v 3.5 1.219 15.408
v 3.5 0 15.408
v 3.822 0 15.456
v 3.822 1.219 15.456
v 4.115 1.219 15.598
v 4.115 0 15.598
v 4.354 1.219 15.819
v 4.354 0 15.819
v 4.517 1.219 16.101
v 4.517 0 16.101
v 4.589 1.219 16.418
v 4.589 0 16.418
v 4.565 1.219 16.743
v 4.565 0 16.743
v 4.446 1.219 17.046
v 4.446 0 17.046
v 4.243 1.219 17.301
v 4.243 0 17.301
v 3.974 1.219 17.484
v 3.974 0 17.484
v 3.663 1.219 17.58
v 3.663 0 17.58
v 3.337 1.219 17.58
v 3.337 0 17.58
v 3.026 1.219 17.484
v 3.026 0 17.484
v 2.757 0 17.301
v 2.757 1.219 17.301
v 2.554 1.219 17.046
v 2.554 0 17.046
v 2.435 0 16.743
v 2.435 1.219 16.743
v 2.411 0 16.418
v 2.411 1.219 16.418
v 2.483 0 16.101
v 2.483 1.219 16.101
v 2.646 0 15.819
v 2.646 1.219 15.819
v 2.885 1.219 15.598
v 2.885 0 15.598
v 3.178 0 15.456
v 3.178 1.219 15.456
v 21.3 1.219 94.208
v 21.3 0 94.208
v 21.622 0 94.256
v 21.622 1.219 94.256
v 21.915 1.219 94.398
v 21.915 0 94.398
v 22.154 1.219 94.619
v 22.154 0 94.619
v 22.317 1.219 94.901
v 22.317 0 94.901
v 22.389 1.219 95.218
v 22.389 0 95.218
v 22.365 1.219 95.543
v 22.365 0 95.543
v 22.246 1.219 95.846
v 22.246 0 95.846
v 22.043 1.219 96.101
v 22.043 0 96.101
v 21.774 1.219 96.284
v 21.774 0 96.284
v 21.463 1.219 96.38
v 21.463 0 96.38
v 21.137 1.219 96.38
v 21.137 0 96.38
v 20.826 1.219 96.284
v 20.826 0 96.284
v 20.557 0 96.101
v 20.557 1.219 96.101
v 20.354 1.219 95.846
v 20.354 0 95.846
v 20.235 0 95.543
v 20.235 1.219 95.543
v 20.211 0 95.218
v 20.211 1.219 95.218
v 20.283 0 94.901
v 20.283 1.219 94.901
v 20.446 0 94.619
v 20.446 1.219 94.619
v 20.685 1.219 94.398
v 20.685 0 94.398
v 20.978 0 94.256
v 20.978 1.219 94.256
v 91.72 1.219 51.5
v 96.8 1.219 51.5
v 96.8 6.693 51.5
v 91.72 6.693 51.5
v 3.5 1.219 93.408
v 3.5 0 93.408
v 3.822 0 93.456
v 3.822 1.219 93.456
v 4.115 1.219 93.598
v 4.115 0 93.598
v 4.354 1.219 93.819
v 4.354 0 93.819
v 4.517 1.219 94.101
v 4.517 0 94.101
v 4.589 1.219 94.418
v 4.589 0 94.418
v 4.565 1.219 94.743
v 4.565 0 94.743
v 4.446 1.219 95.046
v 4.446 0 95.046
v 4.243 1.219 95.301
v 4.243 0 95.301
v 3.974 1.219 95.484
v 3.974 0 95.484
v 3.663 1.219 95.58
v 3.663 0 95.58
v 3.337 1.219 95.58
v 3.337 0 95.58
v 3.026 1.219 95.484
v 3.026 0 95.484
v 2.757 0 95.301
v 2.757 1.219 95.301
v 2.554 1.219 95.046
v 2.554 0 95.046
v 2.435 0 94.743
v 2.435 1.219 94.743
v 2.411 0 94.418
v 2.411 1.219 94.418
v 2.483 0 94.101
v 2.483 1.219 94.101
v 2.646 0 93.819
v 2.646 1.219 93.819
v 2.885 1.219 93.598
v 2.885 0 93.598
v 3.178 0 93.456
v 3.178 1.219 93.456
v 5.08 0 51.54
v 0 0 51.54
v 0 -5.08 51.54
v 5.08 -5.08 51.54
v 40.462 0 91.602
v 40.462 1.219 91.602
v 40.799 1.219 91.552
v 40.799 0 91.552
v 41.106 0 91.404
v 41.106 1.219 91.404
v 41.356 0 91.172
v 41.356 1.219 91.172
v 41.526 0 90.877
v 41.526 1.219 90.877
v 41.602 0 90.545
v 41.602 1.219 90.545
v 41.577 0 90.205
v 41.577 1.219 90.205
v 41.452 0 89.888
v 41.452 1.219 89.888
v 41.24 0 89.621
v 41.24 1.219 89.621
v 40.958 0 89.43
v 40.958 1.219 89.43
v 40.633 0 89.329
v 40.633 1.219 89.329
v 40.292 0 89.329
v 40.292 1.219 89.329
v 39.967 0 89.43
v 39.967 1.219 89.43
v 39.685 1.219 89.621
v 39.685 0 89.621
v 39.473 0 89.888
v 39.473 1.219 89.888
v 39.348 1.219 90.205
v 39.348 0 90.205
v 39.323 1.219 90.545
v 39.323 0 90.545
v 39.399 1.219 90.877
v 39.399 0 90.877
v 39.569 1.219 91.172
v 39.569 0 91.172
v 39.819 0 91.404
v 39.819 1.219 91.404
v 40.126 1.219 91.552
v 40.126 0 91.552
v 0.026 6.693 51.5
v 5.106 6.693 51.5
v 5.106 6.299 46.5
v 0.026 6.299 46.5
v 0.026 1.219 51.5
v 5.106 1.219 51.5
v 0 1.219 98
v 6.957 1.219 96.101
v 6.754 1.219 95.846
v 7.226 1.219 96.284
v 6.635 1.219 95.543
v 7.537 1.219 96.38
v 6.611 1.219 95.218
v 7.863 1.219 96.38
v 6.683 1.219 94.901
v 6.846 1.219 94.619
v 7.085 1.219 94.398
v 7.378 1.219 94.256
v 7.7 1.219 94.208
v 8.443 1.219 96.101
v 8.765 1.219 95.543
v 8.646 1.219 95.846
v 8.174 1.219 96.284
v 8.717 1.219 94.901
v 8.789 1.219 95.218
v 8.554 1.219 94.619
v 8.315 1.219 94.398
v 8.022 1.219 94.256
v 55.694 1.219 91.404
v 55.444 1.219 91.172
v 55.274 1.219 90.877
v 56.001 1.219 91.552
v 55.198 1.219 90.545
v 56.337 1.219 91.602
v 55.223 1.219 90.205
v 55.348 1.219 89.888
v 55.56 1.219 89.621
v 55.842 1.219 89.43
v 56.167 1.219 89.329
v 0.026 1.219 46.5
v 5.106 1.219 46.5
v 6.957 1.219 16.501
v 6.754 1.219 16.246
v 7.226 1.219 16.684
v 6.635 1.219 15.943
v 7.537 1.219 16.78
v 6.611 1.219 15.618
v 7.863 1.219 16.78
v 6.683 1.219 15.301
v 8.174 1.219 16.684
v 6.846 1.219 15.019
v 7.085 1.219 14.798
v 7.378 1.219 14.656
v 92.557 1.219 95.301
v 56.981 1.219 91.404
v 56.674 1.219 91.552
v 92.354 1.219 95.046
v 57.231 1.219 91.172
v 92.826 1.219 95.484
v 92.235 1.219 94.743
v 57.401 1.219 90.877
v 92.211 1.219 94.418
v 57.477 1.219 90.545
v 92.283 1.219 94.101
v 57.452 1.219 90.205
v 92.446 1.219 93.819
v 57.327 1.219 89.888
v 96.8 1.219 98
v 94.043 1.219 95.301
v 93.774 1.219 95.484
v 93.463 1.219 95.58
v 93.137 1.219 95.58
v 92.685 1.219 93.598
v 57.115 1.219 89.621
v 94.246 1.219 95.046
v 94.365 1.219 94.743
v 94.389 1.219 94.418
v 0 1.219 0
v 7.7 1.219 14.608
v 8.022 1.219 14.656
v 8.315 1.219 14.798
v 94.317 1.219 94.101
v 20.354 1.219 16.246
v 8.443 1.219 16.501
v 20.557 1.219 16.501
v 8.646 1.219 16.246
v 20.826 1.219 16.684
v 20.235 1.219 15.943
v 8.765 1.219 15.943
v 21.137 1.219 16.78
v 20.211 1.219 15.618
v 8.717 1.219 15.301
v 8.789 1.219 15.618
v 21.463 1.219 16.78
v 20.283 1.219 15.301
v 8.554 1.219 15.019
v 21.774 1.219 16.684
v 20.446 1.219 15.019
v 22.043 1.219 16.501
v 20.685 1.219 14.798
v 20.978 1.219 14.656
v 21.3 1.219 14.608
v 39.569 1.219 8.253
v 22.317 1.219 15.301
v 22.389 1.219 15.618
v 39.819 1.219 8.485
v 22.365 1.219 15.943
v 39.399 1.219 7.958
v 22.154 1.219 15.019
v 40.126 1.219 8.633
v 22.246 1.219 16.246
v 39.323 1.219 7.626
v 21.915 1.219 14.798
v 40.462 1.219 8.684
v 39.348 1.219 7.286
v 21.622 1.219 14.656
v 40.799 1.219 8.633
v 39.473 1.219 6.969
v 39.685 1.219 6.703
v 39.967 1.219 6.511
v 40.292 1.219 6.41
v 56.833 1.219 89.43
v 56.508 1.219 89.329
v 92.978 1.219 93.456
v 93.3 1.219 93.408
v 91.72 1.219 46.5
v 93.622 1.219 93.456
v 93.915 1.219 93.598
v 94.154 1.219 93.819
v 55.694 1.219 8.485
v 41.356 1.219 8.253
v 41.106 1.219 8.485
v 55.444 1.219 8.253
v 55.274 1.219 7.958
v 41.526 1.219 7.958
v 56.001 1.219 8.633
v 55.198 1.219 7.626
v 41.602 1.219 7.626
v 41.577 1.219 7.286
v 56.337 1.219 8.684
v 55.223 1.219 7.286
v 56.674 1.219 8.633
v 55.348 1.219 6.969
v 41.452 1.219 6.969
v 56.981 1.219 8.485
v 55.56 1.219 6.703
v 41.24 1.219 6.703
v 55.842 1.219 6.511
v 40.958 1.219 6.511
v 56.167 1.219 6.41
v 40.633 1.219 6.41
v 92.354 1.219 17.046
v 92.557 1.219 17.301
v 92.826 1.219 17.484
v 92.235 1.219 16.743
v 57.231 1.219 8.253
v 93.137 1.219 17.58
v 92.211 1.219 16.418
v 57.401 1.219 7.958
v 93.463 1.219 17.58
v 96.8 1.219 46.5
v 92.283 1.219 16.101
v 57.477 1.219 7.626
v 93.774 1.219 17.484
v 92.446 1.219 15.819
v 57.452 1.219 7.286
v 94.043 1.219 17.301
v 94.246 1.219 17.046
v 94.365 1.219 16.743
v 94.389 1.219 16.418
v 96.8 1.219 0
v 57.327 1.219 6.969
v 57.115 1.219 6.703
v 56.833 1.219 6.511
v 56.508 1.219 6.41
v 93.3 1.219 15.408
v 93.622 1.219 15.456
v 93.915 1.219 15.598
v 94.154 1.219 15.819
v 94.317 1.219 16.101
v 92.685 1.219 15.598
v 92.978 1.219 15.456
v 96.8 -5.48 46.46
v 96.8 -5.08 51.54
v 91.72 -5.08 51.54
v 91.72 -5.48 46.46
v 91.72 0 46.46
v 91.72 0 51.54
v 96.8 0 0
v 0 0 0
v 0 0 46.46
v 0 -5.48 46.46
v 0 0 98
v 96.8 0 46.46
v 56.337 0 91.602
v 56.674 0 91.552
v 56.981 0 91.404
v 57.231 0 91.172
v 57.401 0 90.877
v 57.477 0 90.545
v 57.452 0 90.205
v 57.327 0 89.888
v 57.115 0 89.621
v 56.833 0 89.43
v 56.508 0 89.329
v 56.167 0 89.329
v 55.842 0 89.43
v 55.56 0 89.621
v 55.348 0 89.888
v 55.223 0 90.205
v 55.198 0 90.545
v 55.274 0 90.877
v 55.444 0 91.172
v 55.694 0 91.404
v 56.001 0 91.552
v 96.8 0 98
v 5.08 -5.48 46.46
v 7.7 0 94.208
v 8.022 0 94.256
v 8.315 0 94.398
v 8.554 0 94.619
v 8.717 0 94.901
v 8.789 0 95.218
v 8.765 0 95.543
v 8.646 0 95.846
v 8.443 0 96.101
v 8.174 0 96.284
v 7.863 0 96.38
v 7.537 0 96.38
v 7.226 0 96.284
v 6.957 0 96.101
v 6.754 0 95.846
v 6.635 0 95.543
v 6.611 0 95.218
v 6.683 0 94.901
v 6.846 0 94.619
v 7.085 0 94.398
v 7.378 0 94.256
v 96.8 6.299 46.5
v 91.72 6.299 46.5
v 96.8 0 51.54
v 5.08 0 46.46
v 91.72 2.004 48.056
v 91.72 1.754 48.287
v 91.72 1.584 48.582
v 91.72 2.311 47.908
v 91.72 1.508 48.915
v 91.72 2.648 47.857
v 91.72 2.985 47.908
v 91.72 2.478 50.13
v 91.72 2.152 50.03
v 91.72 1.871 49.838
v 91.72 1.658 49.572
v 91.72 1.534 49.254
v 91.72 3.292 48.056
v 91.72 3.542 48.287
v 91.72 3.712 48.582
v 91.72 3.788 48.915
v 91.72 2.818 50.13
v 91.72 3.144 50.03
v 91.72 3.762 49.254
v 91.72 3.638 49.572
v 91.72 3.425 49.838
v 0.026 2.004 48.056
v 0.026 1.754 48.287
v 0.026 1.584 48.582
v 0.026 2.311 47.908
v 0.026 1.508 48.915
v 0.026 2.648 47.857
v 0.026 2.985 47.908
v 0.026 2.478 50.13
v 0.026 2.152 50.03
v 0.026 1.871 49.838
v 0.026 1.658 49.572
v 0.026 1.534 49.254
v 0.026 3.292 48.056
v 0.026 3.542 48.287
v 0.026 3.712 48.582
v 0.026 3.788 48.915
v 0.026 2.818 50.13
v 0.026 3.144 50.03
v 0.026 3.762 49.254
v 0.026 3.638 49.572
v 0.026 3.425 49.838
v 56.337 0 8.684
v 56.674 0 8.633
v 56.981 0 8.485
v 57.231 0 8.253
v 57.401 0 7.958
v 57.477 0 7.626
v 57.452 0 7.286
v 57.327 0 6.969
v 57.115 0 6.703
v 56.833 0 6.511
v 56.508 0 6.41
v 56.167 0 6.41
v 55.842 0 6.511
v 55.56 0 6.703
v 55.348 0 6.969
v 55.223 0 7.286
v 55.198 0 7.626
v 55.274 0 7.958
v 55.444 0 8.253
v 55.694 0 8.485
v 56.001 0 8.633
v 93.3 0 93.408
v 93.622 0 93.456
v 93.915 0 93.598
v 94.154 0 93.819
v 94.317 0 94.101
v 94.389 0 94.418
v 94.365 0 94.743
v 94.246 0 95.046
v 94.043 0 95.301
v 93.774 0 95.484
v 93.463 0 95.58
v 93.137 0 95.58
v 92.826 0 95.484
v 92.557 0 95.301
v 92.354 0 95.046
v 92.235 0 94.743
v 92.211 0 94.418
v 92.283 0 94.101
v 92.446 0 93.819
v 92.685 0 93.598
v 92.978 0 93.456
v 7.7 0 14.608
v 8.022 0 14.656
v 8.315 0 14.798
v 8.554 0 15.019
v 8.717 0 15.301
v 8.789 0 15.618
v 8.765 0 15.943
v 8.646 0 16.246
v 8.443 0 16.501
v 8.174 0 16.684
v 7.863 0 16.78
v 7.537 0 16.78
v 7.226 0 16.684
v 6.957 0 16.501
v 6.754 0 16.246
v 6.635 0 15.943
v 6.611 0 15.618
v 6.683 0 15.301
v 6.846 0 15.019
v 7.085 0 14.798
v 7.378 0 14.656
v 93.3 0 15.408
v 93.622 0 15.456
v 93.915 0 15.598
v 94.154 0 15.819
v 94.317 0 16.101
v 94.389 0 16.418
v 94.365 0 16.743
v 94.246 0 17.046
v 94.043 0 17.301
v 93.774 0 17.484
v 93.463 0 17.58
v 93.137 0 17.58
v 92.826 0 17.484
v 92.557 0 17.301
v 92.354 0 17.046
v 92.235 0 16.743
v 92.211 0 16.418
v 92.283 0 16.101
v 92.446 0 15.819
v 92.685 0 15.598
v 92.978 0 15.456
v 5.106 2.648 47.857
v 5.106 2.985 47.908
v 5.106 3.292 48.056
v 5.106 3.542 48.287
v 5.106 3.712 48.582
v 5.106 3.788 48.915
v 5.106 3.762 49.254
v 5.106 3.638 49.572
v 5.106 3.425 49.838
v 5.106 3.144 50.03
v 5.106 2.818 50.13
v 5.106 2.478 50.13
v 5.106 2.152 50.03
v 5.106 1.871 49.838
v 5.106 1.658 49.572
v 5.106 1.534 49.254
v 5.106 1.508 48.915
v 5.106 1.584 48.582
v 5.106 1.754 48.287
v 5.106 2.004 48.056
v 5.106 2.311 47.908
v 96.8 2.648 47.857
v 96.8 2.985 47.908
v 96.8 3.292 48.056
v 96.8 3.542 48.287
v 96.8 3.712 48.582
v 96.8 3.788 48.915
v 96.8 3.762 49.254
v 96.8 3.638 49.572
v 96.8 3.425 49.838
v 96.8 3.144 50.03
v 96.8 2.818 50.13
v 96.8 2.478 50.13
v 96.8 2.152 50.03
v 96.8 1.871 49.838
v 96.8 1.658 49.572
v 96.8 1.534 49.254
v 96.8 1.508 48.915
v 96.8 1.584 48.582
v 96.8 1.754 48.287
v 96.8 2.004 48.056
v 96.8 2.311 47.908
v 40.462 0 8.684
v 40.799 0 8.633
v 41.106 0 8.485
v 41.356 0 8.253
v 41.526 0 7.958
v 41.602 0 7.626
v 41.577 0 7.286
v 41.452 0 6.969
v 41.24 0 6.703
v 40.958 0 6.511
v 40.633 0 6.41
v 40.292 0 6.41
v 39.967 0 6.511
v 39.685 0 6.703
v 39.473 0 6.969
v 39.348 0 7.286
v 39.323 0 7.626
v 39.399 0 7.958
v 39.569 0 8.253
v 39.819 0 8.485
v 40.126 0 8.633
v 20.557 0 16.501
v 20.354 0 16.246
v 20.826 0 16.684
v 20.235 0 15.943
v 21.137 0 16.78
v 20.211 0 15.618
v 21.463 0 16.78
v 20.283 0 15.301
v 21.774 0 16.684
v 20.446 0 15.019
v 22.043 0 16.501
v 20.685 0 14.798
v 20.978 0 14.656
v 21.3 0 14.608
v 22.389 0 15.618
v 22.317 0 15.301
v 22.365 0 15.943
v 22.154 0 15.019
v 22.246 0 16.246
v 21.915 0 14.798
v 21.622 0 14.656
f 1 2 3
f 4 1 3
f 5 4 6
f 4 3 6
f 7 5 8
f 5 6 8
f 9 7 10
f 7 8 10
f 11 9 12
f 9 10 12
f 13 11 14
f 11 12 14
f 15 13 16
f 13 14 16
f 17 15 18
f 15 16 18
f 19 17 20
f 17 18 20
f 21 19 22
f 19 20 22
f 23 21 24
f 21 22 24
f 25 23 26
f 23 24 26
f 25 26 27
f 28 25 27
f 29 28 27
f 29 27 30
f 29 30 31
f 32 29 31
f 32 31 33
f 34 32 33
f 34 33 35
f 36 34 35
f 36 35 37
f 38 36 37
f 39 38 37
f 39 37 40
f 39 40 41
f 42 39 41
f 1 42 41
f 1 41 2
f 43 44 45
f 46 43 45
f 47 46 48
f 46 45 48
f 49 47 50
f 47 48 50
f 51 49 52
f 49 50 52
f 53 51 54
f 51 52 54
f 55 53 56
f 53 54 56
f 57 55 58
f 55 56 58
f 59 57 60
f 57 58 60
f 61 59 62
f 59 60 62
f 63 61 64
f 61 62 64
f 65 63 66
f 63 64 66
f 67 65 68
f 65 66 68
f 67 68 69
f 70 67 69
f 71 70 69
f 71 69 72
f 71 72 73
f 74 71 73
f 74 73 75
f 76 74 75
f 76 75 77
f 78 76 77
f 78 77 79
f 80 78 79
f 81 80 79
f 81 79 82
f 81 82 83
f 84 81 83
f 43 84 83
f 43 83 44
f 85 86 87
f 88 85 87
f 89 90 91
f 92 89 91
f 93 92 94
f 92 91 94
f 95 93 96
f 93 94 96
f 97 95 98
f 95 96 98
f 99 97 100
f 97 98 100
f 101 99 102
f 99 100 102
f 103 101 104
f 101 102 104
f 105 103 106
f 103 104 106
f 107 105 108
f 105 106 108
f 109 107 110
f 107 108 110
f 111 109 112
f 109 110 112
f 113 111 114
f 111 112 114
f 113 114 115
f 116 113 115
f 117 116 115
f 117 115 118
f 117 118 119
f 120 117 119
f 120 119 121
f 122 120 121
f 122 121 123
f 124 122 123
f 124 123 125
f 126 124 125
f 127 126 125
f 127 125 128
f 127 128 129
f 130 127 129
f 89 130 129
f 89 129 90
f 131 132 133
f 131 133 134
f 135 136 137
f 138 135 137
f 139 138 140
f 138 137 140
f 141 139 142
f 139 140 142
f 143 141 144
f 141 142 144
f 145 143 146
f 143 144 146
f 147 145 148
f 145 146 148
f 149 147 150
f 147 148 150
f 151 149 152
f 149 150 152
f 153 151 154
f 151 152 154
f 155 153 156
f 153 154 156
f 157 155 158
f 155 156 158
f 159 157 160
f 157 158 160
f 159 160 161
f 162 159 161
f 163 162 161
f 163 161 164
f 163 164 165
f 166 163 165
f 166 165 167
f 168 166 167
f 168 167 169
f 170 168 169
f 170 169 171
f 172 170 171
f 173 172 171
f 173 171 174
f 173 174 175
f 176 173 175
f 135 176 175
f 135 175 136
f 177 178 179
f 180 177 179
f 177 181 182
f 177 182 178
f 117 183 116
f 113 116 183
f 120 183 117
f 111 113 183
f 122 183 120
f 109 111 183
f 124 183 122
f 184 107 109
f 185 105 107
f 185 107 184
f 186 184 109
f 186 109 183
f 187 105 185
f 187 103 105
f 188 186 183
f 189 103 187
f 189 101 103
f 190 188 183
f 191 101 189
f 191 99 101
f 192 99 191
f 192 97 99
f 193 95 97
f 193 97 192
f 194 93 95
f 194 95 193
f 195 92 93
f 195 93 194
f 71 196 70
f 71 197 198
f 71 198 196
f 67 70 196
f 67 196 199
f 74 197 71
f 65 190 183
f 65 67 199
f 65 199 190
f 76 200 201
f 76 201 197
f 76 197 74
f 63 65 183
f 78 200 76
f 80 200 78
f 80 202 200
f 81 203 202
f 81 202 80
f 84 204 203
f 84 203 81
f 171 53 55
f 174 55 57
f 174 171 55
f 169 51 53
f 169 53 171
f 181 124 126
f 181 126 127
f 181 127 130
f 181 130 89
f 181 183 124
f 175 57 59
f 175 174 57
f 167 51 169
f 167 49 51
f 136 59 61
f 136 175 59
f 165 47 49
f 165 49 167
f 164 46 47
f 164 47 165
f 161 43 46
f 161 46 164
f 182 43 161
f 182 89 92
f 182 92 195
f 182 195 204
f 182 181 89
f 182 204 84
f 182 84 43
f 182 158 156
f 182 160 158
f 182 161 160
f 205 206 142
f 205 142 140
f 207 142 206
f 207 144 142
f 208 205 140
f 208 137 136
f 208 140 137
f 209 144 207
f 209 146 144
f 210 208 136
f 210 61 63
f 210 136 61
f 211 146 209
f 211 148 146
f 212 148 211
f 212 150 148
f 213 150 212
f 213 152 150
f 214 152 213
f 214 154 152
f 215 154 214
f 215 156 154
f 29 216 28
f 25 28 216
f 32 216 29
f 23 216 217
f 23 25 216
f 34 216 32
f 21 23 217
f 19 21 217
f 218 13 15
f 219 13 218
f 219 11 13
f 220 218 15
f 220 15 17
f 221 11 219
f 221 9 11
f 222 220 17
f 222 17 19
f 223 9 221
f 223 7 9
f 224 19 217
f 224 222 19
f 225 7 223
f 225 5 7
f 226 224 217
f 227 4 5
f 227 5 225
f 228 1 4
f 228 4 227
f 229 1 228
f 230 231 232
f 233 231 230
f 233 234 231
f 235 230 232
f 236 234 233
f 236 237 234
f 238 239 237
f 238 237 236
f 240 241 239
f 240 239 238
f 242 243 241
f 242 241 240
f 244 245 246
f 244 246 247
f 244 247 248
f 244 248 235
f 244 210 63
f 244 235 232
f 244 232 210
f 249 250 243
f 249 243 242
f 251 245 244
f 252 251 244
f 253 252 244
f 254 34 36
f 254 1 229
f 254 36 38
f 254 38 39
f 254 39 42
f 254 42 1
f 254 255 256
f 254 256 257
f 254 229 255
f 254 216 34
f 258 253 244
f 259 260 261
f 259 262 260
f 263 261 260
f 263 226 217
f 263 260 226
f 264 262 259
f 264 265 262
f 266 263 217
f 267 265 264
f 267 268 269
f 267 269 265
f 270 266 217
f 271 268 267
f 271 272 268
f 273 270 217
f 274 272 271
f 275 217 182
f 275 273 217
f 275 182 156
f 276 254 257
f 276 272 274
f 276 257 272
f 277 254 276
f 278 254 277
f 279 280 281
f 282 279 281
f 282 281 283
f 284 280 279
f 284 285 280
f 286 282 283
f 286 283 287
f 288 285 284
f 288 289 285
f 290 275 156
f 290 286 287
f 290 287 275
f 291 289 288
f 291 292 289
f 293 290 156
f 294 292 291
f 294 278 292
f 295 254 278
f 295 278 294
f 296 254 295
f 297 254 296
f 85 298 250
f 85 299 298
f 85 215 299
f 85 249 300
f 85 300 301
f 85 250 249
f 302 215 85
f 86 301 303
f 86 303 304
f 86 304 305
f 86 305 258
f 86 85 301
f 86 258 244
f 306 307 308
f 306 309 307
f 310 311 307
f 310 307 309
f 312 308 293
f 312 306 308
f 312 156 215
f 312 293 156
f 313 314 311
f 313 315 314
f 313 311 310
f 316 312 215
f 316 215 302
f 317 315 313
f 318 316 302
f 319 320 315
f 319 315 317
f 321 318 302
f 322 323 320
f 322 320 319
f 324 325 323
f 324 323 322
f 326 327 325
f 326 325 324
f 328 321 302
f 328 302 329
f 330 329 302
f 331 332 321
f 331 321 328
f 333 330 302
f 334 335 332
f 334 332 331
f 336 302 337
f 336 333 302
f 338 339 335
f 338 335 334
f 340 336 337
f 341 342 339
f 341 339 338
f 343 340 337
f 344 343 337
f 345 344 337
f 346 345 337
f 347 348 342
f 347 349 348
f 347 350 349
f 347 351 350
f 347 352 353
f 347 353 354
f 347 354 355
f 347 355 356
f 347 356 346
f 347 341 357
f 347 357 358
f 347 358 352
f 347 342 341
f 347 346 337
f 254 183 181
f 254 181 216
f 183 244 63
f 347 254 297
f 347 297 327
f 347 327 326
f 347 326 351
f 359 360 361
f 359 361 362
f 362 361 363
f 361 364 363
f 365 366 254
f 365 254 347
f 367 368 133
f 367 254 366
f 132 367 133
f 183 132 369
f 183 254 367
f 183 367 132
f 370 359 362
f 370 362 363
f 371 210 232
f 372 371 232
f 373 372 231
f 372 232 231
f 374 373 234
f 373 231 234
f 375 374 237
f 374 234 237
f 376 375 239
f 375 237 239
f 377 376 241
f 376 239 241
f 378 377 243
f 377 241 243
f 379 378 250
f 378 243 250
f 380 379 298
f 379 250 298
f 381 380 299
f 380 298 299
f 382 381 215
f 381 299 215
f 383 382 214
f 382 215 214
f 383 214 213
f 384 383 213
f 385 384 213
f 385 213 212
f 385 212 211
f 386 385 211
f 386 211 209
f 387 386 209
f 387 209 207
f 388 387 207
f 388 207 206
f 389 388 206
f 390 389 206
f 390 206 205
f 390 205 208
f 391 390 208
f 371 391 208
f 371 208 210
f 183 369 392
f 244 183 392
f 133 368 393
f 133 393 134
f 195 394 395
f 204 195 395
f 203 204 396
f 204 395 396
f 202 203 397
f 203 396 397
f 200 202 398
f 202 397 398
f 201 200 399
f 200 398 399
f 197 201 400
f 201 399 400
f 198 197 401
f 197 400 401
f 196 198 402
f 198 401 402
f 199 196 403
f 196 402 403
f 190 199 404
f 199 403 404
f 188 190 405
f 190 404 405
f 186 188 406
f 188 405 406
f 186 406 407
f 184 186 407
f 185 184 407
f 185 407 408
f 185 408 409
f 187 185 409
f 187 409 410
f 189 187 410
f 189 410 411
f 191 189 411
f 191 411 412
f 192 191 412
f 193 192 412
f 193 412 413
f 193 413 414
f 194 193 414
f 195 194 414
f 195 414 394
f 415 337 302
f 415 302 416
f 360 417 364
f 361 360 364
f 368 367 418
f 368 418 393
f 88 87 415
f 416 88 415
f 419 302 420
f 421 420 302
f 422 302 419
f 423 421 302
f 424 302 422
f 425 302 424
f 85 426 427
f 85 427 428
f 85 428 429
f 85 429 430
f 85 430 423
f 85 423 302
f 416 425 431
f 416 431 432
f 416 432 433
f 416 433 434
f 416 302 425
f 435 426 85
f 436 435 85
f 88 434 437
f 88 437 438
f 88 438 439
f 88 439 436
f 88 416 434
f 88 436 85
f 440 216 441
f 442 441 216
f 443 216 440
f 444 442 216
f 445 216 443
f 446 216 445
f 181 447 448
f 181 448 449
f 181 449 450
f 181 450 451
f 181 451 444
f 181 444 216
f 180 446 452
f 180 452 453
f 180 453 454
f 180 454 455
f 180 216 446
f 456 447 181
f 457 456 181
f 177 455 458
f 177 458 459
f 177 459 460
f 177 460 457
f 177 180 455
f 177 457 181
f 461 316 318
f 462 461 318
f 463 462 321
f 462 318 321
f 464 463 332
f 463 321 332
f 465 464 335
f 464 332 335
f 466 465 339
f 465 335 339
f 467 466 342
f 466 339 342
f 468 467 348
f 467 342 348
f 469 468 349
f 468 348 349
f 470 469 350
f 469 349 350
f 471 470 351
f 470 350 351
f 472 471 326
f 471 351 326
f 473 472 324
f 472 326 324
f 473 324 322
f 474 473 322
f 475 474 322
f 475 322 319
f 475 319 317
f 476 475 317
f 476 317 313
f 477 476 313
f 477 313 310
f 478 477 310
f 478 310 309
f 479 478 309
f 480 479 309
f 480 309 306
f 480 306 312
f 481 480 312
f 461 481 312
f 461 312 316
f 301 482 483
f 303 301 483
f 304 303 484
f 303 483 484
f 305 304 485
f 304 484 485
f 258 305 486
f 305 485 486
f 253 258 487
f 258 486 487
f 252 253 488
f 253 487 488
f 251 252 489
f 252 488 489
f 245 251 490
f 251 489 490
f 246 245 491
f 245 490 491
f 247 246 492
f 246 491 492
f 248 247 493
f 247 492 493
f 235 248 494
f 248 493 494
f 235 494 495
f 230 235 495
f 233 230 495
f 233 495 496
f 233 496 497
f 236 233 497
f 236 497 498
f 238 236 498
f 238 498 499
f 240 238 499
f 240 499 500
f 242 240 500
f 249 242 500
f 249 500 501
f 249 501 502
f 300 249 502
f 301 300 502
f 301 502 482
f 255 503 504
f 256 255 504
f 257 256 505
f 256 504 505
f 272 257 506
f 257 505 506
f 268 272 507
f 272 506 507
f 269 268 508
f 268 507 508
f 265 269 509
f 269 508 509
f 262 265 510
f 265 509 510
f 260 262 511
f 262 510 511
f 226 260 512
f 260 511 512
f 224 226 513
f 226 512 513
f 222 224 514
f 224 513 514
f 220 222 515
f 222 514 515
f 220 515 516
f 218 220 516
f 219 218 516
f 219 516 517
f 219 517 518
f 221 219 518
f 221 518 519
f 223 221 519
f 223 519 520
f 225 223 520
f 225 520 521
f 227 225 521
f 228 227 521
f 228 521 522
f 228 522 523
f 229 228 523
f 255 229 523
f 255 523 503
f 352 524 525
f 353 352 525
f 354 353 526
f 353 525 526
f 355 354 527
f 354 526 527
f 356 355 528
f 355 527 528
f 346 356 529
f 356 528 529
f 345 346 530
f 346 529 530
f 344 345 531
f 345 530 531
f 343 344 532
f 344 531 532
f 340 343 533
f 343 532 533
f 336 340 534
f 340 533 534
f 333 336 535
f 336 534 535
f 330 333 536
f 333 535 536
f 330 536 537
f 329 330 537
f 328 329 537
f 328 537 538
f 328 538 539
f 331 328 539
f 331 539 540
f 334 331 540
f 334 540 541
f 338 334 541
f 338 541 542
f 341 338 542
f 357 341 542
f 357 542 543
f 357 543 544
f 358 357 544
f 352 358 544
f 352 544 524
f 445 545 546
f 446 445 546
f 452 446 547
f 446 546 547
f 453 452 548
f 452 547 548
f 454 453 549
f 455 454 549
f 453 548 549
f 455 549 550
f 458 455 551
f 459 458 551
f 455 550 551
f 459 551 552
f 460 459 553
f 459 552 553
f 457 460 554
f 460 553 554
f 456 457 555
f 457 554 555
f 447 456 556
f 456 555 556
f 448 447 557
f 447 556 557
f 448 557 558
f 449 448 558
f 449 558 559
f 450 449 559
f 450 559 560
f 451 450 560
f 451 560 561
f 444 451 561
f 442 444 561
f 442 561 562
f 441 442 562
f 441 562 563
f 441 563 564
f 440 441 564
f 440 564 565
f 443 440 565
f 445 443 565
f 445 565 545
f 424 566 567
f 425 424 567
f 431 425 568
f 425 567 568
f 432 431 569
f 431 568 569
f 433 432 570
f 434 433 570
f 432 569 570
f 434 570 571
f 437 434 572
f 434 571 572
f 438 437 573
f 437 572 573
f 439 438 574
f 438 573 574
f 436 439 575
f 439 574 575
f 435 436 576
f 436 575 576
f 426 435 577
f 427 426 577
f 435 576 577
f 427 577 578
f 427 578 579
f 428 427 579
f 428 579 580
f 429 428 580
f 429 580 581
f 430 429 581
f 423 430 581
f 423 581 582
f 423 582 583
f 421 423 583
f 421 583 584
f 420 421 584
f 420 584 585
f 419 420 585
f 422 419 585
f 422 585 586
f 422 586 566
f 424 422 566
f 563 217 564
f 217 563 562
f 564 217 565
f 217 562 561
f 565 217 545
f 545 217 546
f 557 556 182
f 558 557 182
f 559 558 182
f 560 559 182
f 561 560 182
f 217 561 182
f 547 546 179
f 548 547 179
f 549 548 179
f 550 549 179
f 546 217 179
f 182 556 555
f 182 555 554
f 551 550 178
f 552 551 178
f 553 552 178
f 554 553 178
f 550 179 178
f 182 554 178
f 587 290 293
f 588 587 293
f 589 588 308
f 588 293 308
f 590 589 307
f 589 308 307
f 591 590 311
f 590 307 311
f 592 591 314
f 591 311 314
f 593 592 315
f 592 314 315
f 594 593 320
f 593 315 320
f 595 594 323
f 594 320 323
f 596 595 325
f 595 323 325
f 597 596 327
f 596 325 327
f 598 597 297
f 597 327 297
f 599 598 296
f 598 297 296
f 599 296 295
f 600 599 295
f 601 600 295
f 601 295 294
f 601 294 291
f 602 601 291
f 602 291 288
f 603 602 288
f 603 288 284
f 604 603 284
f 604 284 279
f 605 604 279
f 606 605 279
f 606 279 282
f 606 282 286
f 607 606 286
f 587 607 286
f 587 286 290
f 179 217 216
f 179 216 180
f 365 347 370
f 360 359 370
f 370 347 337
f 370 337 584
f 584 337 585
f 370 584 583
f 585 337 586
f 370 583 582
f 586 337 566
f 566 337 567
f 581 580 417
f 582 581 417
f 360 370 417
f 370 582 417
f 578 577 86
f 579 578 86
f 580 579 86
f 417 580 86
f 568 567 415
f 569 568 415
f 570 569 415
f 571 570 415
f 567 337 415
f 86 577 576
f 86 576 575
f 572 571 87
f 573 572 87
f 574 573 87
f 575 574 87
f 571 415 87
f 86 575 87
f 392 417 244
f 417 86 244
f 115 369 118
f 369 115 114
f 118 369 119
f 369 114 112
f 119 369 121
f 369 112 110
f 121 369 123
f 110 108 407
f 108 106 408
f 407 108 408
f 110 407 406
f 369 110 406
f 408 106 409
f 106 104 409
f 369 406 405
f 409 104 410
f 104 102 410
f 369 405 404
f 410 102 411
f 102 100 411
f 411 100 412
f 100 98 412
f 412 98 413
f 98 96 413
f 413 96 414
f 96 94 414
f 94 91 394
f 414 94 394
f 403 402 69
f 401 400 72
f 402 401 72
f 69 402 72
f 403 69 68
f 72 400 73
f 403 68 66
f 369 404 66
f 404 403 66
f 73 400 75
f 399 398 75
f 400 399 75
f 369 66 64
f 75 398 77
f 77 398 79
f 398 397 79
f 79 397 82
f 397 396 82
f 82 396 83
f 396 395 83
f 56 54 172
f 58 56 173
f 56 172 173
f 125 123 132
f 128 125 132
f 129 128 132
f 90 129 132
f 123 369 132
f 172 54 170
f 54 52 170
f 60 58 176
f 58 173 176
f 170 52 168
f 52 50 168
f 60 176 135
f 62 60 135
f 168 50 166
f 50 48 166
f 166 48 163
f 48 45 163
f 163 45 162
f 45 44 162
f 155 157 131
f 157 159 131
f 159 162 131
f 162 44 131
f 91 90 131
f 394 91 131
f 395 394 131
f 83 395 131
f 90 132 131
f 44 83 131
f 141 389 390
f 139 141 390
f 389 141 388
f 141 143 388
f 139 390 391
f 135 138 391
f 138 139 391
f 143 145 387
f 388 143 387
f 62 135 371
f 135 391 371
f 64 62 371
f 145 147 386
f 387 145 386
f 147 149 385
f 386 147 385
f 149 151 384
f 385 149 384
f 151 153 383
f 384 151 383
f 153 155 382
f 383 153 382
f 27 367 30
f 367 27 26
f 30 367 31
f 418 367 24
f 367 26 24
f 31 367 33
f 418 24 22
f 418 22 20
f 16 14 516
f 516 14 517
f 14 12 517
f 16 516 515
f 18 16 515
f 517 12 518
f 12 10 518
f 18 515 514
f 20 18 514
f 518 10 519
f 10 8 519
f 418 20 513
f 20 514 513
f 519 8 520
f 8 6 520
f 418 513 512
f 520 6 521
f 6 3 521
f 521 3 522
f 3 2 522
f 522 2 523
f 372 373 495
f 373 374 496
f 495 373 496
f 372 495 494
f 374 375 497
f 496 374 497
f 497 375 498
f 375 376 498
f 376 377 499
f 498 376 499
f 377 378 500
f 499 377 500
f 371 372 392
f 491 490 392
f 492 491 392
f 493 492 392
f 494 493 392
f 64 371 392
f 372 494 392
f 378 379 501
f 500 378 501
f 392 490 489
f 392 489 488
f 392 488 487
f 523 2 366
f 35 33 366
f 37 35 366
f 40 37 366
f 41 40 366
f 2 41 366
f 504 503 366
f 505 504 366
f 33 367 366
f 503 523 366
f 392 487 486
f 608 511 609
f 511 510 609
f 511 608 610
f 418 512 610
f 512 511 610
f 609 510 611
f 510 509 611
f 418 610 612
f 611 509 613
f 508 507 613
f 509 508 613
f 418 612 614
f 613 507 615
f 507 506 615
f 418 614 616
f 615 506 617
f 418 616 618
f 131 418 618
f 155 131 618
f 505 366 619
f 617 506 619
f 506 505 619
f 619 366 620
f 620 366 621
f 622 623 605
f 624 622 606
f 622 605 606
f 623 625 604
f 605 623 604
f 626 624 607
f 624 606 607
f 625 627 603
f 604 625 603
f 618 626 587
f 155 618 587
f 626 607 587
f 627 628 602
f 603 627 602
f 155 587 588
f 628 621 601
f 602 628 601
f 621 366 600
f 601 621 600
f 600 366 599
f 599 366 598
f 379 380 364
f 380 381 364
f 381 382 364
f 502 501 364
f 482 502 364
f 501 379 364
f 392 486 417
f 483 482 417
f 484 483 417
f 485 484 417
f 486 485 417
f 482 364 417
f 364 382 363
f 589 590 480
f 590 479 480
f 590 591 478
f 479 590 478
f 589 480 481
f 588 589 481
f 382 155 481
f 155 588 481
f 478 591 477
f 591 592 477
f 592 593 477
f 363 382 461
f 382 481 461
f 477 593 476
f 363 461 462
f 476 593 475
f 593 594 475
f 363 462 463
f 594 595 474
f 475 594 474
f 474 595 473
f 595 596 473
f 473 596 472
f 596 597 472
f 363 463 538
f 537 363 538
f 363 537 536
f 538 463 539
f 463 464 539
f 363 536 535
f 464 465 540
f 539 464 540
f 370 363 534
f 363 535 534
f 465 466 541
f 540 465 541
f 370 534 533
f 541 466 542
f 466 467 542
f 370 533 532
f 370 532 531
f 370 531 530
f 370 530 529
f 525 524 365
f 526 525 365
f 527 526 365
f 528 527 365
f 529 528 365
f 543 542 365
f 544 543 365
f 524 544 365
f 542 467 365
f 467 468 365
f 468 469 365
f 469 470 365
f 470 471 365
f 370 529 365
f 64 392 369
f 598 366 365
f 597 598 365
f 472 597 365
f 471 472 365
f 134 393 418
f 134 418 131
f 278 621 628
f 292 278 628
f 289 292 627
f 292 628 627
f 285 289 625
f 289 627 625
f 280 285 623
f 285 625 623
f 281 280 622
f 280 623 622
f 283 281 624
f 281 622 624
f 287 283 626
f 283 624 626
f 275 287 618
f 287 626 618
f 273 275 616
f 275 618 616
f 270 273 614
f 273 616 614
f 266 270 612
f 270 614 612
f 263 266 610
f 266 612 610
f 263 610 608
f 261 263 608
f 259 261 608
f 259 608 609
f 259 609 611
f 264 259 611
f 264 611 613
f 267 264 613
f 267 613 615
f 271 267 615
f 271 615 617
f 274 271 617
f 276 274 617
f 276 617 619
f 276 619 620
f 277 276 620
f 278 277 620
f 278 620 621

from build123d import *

# Parameters (mm, degrees)
SKETCH1_W           = 96.799999948
SKETCH1_H           = 98
BOSS_EXTRUDE1_DEPTH = 1.2192
CUT_EXTRUDE1_REACH  = 139.752
SKETCH5_R           = 1.0922
CUT_EXTRUDE2_REACH  = 139.752
SKETCH6_R           = 1.143
SKETCH10_W          = 5
SKETCH10_H          = 5.08
SKETCH10_R          = 1.143
BOSS_EXTRUDE2_DEPTH = 96.774
SKETCH13_W          = 86.614
SKETCH13_H          = 5
CUT_EXTRUDE3_DEPTH  = 5.08
BOSS_EXTRUDE3_DEPTH = 5.08
BOSS_EXTRUDE5_DEPTH = 5.08
BOSS_EXTRUDE6_DEPTH = 5.08
BOSS_EXTRUDE7_DEPTH = 5.08
BOSS_EXTRUDE8_DEPTH = 5.08


with BuildPart() as part:
    # Sketch1 → Boss-Extrude1 (new body)
    with BuildSketch(Plane(origin=(0, 0, 0), x_dir=(1, 0, 0), z_dir=(0, 1, 0))):
        with Locations((48.399999974, -49)):
            Rectangle(SKETCH1_W, SKETCH1_H)
    extrude(amount=BOSS_EXTRUDE1_DEPTH)

    # Sketch5 → Cut-Extrude1 (cut, up to next)
    with BuildSketch(Plane(origin=(0, 0, 0), x_dir=(-1, 0, 0), z_dir=(0, -1, 0)), mode=Mode.PRIVATE) as cut_extrude1_sk1:
        with Locations(Location((-3.5, -94.5, 0), (0, 0, 90))):
            Circle(SKETCH5_R)
    cut_extrude1_tool1 = extrude(cut_extrude1_sk1.sketch, amount=-CUT_EXTRUDE1_REACH, mode=Mode.PRIVATE) & part.part
    # Sketch5 → Cut-Extrude1 (cut, up to next)
    with BuildSketch(Plane(origin=(0, 0, 0), x_dir=(-1, 0, 0), z_dir=(0, -1, 0)), mode=Mode.PRIVATE) as cut_extrude1_sk2:
        with Locations(Location((-7.7, -95.3, 0), (0, 0, 90))):
            Circle(SKETCH5_R)
    cut_extrude1_tool2 = extrude(cut_extrude1_sk2.sketch, amount=-CUT_EXTRUDE1_REACH, mode=Mode.PRIVATE) & part.part
    # Sketch5 → Cut-Extrude1 (cut, up to next)
    with BuildSketch(Plane(origin=(0, 0, 0), x_dir=(-1, 0, 0), z_dir=(0, -1, 0)), mode=Mode.PRIVATE) as cut_extrude1_sk3:
        with Locations(Location((-21.3, -95.3, 0), (0, 0, 90))):
            Circle(SKETCH5_R)
    cut_extrude1_tool3 = extrude(cut_extrude1_sk3.sketch, amount=-CUT_EXTRUDE1_REACH, mode=Mode.PRIVATE) & part.part
    # Sketch5 → Cut-Extrude1 (cut, up to next)
    with BuildSketch(Plane(origin=(0, 0, 0), x_dir=(-1, 0, 0), z_dir=(0, -1, 0)), mode=Mode.PRIVATE) as cut_extrude1_sk4:
        with Locations(Location((-93.3, -94.5, 0), (0, 0, 90))):
            Circle(SKETCH5_R)
    cut_extrude1_tool4 = extrude(cut_extrude1_sk4.sketch, amount=-CUT_EXTRUDE1_REACH, mode=Mode.PRIVATE) & part.part
    # Sketch5 → Cut-Extrude1 (cut, up to next)
    with BuildSketch(Plane(origin=(0, 0, 0), x_dir=(-1, 0, 0), z_dir=(0, -1, 0)), mode=Mode.PRIVATE) as cut_extrude1_sk5:
        with Locations(Location((-93.3, -16.5, 0), (0, 0, 90))):
            Circle(SKETCH5_R)
    cut_extrude1_tool5 = extrude(cut_extrude1_sk5.sketch, amount=-CUT_EXTRUDE1_REACH, mode=Mode.PRIVATE) & part.part
    # Sketch5 → Cut-Extrude1 (cut, up to next)
    with BuildSketch(Plane(origin=(0, 0, 0), x_dir=(-1, 0, 0), z_dir=(0, -1, 0)), mode=Mode.PRIVATE) as cut_extrude1_sk6:
        with Locations(Location((-3.5, -16.5, 0), (0, 0, 90))):
            Circle(SKETCH5_R)
    cut_extrude1_tool6 = extrude(cut_extrude1_sk6.sketch, amount=-CUT_EXTRUDE1_REACH, mode=Mode.PRIVATE) & part.part
    # Sketch5 → Cut-Extrude1 (cut, up to next)
    with BuildSketch(Plane(origin=(0, 0, 0), x_dir=(-1, 0, 0), z_dir=(0, -1, 0)), mode=Mode.PRIVATE) as cut_extrude1_sk7:
        with Locations(Location((-7.7, -15.7, 0), (0, 0, 90))):
            Circle(SKETCH5_R)
    cut_extrude1_tool7 = extrude(cut_extrude1_sk7.sketch, amount=-CUT_EXTRUDE1_REACH, mode=Mode.PRIVATE) & part.part
    # Sketch5 → Cut-Extrude1 (cut, up to next)
    with BuildSketch(Plane(origin=(0, 0, 0), x_dir=(-1, 0, 0), z_dir=(0, -1, 0)), mode=Mode.PRIVATE) as cut_extrude1_sk8:
        with Locations(Location((-21.3, -15.7, 0), (0, 0, 90))):
            Circle(SKETCH5_R)
    cut_extrude1_tool8 = extrude(cut_extrude1_sk8.sketch, amount=-CUT_EXTRUDE1_REACH, mode=Mode.PRIVATE) & part.part
    add(cut_extrude1_tool1.solids().sort_by_distance((3.5, 0, 94.5))[0], mode=Mode.SUBTRACT)
    add(cut_extrude1_tool2.solids().sort_by_distance((7.7, 0, 95.3))[0], mode=Mode.SUBTRACT)
    add(cut_extrude1_tool3.solids().sort_by_distance((21.3, 0, 95.3))[0], mode=Mode.SUBTRACT)
    add(cut_extrude1_tool4.solids().sort_by_distance((93.3, 0, 94.5))[0], mode=Mode.SUBTRACT)
    add(cut_extrude1_tool5.solids().sort_by_distance((93.3, 0, 16.5))[0], mode=Mode.SUBTRACT)
    add(cut_extrude1_tool6.solids().sort_by_distance((3.5, 0, 16.5))[0], mode=Mode.SUBTRACT)
    add(cut_extrude1_tool7.solids().sort_by_distance((7.7, 0, 15.7))[0], mode=Mode.SUBTRACT)
    add(cut_extrude1_tool8.solids().sort_by_distance((21.3, 0, 15.7))[0], mode=Mode.SUBTRACT)

    # Sketch6 → Cut-Extrude2 (cut, up to next)
    with BuildSketch(Plane(origin=(0, 1.2192, 0), x_dir=(1, 0, 0), z_dir=(0, 1, 0)), mode=Mode.PRIVATE) as cut_extrude2_sk1:
        with Locations(Location((56.337499948, -7.540625, 0), (0, 0, 270))):
            Circle(SKETCH6_R)
    cut_extrude2_tool1 = extrude(cut_extrude2_sk1.sketch, amount=-CUT_EXTRUDE2_REACH, mode=Mode.PRIVATE) & part.part
    # Sketch6 → Cut-Extrude2 (cut, up to next)
    with BuildSketch(Plane(origin=(0, 1.2192, 0), x_dir=(1, 0, 0), z_dir=(0, 1, 0)), mode=Mode.PRIVATE) as cut_extrude2_sk2:
        with Locations(Location((40.462499948, -7.540625, 0), (0, 0, 270))):
            Circle(SKETCH6_R)
    cut_extrude2_tool2 = extrude(cut_extrude2_sk2.sketch, amount=-CUT_EXTRUDE2_REACH, mode=Mode.PRIVATE) & part.part
    # Sketch6 → Cut-Extrude2 (cut, up to next)
    with BuildSketch(Plane(origin=(0, 1.2192, 0), x_dir=(1, 0, 0), z_dir=(0, 1, 0)), mode=Mode.PRIVATE) as cut_extrude2_sk3:
        with Locations(Location((40.462499948, -90.459375, 0), (0, 0, 270))):
            Circle(SKETCH6_R)
    cut_extrude2_tool3 = extrude(cut_extrude2_sk3.sketch, amount=-CUT_EXTRUDE2_REACH, mode=Mode.PRIVATE) & part.part
    # Sketch6 → Cut-Extrude2 (cut, up to next)
    with BuildSketch(Plane(origin=(0, 1.2192, 0), x_dir=(1, 0, 0), z_dir=(0, 1, 0)), mode=Mode.PRIVATE) as cut_extrude2_sk4:
        with Locations(Location((56.337499948, -90.459375, 0), (0, 0, 270))):
            Circle(SKETCH6_R)
    cut_extrude2_tool4 = extrude(cut_extrude2_sk4.sketch, amount=-CUT_EXTRUDE2_REACH, mode=Mode.PRIVATE) & part.part
    add(cut_extrude2_tool1.solids().sort_by_distance((56.3375, 1.2192, 7.540625))[0], mode=Mode.SUBTRACT)
    add(cut_extrude2_tool2.solids().sort_by_distance((40.4625, 1.2192, 7.540625))[0], mode=Mode.SUBTRACT)
    add(cut_extrude2_tool3.solids().sort_by_distance((40.4625, 1.2192, 90.459375))[0], mode=Mode.SUBTRACT)
    add(cut_extrude2_tool4.solids().sort_by_distance((56.3375, 1.2192, 90.459375))[0], mode=Mode.SUBTRACT)

    # Sketch10 → Boss-Extrude2 (add)
    with BuildSketch(Plane(origin=(96.799999948, 0, 0), x_dir=(0, 0, -1), z_dir=(1, 0, 0))):
        with Locations((-49, 3.7592)):
            Rectangle(SKETCH10_W, SKETCH10_H)
        with Locations((-49, 2.64795)):
            Circle(SKETCH10_R, mode=Mode.SUBTRACT)
    extrude(amount=-BOSS_EXTRUDE2_DEPTH)

    # Sketch13 → Cut-Extrude3 (cut)
    with BuildSketch(Plane(origin=(0, 6.2992, 0), x_dir=(1, 0, 0), z_dir=(0, 1, 0))):
        with Locations((48.412999948, -49)):
            Rectangle(SKETCH13_W, SKETCH13_H)
    extrude(amount=-CUT_EXTRUDE3_DEPTH, mode=Mode.SUBTRACT)

    # Sketch14 → Boss-Extrude3 (add)
    with BuildSketch(Plane.XZ):
        Polygon((0, 49), (0, 51.54), (5.08, 51.54), (5.08, 46.46), (0, 46.46), align=None)
        Polygon((96.799999948, 49), (96.799999948, 51.54), (91.719999948, 51.54), (91.719999948, 46.46), (96.799999948, 46.46), align=None)
    extrude(amount=BOSS_EXTRUDE3_DEPTH)

    # Sketch15 → Boss-Extrude5 (add)
    with BuildSketch(Plane.ZY):
        Polygon((51.54, -5.08), (46.46, -5.08), (46.46, -5.479804671), align=None)
    extrude(amount=-BOSS_EXTRUDE5_DEPTH)

    # Sketch16 → Boss-Extrude6 (add)
    with BuildSketch(Plane(origin=(96.799999948, 0, 0), x_dir=(0, 0, -1), z_dir=(1, 0, 0))):
        Polygon((-46.46, -5.08), (-51.54, -5.08), (-46.46, -5.479804671), align=None)
    extrude(amount=-BOSS_EXTRUDE6_DEPTH)

    # Sketch17 → Boss-Extrude7 (add)
    with BuildSketch(Plane(origin=(96.799999948, 0, 0), x_dir=(0, 0, -1), z_dir=(1, 0, 0))):
        Polygon((-46.5, 6.2992), (-51.5, 6.2992), (-51.5, 6.692708534), align=None)
    extrude(amount=-BOSS_EXTRUDE7_DEPTH)

    # Sketch18 → Boss-Extrude8 (add)
    with BuildSketch(Plane.ZY.offset(-0.025999948)):
        Polygon((46.5, 6.2992), (51.5, 6.2992), (51.5, 6.692708534), align=None)
    extrude(amount=-BOSS_EXTRUDE8_DEPTH)


solid = part.part
